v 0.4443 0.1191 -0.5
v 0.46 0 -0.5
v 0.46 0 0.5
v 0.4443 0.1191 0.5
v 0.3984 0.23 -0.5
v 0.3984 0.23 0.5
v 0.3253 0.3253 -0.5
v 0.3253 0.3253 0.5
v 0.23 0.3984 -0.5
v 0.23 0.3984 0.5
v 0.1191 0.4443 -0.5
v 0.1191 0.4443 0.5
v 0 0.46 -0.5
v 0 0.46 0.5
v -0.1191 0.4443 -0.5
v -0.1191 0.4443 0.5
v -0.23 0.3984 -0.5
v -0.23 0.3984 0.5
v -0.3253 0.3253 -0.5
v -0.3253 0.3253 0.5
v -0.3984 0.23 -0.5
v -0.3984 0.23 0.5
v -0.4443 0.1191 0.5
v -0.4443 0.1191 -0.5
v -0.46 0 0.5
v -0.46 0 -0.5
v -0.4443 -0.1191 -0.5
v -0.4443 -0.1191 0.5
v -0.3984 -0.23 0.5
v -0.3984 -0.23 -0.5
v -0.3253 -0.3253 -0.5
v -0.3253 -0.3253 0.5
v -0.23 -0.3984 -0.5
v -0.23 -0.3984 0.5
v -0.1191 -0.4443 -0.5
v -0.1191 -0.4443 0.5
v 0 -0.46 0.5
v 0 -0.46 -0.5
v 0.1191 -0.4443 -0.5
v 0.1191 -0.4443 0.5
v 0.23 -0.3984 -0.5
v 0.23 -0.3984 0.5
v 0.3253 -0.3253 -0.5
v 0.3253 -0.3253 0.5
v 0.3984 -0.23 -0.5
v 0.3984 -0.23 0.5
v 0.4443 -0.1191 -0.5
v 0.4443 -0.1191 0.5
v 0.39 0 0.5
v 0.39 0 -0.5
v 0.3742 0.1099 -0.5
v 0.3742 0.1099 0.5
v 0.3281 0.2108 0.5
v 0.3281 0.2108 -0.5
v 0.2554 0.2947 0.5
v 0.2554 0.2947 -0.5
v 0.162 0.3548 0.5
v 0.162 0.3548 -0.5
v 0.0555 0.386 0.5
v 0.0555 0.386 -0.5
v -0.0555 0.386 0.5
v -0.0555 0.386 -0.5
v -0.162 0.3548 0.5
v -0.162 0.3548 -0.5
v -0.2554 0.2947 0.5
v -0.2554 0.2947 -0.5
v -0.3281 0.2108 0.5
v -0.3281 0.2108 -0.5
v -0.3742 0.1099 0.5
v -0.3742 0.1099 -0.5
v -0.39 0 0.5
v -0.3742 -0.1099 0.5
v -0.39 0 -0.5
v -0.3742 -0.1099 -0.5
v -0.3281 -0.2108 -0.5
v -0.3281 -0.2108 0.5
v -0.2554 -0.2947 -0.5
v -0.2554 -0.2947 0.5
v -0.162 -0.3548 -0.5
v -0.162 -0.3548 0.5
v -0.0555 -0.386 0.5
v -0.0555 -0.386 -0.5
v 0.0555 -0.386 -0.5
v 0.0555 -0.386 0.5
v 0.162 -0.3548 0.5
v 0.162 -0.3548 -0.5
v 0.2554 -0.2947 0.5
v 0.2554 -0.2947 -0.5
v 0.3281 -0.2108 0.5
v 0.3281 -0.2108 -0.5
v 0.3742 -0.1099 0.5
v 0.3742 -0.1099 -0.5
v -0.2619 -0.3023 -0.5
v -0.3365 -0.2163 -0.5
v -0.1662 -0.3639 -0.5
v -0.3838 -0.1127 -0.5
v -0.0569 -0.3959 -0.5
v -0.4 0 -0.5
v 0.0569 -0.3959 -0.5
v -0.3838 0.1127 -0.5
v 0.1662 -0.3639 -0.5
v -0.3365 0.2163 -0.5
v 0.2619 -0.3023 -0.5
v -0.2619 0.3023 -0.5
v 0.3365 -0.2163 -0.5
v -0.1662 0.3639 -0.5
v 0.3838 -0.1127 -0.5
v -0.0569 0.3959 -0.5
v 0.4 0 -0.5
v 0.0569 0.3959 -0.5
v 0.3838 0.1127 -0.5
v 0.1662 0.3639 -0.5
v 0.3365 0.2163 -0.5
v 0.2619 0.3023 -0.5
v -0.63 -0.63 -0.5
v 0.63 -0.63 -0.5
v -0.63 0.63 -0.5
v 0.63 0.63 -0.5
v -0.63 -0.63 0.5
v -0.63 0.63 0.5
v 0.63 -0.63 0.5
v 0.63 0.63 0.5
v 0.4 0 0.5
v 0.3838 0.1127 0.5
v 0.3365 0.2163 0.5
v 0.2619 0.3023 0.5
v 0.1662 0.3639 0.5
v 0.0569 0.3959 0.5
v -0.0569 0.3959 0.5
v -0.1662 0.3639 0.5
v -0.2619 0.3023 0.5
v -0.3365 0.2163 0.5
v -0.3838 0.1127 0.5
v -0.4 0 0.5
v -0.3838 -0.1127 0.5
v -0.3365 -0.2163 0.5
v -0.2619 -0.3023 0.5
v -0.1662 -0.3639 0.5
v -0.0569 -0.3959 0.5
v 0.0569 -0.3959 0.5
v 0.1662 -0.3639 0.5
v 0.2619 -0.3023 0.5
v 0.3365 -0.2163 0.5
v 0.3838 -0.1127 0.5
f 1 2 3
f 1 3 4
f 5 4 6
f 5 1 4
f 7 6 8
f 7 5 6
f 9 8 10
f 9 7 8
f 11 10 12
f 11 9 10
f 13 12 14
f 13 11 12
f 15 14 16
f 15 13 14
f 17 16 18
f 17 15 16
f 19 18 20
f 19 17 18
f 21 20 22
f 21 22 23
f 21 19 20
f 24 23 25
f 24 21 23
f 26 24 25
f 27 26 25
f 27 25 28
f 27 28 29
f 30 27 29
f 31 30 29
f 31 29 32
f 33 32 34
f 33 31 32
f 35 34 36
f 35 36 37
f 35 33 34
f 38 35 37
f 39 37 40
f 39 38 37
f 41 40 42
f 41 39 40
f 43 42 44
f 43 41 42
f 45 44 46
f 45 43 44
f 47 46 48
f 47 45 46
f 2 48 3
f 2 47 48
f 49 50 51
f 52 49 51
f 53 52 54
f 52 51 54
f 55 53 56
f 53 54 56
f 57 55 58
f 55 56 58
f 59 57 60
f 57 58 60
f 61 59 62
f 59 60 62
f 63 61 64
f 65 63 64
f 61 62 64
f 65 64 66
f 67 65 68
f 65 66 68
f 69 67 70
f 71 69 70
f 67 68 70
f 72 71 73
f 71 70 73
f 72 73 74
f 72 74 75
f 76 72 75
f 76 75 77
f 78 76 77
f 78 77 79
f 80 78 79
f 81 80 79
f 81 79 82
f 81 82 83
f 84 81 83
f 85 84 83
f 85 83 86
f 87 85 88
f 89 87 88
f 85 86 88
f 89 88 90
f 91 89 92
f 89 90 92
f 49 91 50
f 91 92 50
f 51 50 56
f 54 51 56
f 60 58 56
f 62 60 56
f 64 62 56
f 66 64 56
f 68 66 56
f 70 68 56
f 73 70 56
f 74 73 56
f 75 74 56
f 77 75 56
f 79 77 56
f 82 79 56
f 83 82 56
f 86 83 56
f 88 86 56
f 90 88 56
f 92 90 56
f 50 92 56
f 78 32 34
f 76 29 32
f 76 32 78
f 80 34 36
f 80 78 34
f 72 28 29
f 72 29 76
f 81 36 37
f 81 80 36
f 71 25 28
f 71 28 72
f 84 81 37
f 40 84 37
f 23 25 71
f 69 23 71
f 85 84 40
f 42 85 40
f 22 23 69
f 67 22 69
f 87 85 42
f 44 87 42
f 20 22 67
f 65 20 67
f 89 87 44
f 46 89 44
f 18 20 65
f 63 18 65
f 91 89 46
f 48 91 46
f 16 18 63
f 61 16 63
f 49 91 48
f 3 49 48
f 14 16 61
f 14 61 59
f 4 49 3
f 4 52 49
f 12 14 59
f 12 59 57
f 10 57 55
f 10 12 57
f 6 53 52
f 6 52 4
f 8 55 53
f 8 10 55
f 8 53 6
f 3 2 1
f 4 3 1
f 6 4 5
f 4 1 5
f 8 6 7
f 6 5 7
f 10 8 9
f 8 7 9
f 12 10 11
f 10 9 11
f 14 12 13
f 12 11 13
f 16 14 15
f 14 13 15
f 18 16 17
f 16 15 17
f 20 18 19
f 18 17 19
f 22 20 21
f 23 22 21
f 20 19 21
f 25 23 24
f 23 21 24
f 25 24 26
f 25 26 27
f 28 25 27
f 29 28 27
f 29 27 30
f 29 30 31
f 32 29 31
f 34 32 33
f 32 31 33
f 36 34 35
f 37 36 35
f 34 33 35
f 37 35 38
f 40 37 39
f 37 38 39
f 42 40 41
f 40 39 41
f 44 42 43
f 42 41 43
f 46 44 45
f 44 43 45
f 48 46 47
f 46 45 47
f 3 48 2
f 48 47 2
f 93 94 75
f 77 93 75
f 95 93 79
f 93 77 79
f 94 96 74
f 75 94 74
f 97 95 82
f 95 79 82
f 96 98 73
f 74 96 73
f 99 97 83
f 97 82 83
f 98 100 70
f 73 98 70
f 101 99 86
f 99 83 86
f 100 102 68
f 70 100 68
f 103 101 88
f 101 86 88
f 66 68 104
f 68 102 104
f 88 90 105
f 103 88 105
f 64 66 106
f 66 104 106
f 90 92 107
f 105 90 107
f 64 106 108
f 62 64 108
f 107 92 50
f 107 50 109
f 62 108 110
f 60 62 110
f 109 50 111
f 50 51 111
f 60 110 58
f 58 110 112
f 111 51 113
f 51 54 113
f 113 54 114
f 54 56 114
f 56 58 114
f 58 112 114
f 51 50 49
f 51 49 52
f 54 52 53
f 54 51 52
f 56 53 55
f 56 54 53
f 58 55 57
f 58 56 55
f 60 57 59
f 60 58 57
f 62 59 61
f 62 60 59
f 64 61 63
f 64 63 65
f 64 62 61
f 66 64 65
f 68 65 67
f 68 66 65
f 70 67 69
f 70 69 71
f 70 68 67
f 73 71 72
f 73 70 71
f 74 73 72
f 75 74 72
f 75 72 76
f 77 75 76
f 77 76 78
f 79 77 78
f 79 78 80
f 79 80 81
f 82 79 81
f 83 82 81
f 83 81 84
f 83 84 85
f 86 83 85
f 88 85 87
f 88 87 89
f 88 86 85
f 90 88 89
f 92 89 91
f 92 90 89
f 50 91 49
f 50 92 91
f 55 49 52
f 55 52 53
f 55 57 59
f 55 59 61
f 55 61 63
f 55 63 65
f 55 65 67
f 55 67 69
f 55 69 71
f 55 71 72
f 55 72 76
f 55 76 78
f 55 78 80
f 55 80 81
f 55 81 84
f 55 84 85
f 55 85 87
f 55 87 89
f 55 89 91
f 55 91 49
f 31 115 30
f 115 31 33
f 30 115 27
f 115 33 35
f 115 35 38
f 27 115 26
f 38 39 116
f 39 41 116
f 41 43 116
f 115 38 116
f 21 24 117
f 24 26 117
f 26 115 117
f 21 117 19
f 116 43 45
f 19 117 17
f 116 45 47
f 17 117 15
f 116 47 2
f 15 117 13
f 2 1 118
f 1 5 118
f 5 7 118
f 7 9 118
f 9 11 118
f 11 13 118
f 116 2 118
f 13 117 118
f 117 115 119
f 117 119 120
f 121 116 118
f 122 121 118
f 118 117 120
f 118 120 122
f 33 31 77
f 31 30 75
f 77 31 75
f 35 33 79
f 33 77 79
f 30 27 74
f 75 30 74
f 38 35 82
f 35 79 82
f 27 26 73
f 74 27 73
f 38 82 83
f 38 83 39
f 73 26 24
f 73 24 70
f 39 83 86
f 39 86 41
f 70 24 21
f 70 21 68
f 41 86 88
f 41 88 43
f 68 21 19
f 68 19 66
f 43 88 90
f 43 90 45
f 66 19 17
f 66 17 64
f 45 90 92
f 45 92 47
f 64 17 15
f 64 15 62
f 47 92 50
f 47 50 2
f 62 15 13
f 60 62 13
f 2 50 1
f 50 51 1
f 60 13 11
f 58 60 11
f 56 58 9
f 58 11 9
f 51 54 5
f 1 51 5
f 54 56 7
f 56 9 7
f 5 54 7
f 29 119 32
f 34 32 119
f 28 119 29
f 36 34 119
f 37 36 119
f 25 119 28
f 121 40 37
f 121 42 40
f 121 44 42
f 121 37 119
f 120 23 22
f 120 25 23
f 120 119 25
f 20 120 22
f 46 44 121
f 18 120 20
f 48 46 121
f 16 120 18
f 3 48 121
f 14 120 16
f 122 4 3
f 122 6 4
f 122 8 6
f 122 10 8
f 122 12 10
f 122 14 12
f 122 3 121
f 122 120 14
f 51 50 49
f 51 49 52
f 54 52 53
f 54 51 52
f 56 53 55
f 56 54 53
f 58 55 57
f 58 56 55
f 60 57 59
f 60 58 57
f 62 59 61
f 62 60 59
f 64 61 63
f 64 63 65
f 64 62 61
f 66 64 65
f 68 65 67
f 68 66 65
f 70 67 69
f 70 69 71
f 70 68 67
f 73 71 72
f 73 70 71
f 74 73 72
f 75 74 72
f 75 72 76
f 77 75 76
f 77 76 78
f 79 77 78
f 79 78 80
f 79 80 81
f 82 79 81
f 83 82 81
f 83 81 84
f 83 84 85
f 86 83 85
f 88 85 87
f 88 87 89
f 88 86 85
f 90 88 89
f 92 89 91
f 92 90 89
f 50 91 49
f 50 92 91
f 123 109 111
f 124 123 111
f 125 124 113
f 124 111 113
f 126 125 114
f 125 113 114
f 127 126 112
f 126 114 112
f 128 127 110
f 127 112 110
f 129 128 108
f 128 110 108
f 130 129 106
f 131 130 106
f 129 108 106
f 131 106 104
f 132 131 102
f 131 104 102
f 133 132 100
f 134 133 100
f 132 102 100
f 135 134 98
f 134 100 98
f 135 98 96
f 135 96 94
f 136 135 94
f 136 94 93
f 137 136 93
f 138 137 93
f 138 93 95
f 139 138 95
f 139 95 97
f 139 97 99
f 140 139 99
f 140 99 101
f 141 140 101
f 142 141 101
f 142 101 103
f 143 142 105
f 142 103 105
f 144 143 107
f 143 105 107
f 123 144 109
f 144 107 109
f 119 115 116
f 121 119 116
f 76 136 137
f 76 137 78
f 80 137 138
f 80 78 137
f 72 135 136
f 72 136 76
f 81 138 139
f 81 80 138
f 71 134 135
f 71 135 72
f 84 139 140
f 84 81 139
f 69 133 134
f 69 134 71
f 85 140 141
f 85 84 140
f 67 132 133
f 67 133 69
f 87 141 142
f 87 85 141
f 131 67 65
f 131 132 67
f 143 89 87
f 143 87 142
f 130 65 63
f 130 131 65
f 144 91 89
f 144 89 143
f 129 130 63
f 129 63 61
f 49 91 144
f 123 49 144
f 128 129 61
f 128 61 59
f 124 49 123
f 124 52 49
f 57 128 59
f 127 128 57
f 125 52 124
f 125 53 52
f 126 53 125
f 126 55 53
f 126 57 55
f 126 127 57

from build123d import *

# Parameters (mm, degrees)
CYLINDER_R        = 0.39
CYLINDER_DEPTH    = 1
CYLINDER001_R     = 0.4
CYLINDER001_DEPTH = 1
CYLINDER004_R     = 0.39
CYLINDER004_DEPTH = 1
CYLINDER003_R     = 0.39
CYLINDER003_DEPTH = 1
CYLINDER002_R     = 0.46
CYLINDER002_DEPTH = 1
CYLINDER005_R     = 0.46
CYLINDER005_DEPTH = 1
BOX_W             = 1.26
BOX_H             = 1.26
BOX_DEPTH         = 1


with BuildPart() as fuel_region:
    # Cylinder → Cylinder (new body)
    with BuildSketch(Plane.XY.offset(-0.5)):
        Circle(CYLINDER_R)
    extrude(amount=CYLINDER_DEPTH)


with BuildPart() as gap_region:
    # Cylinder001 → Cylinder001 (new body)
    with BuildSketch(Plane.XY.offset(-0.5)):
        Circle(CYLINDER001_R)
    extrude(amount=CYLINDER001_DEPTH)

    # Cut: cut fuel_region
    add(fuel_region.part, mode=Mode.SUBTRACT)


with BuildPart() as cylinder004:
    # Cylinder004 → Cylinder004 (new body)
    with BuildSketch(Plane.XY.offset(-0.5)):
        Circle(CYLINDER004_R)
    extrude(amount=CYLINDER004_DEPTH)


with BuildPart() as fuel_region001:
    # Cylinder003 → Cylinder003 (new body)
    with BuildSketch(Plane.XY.offset(-0.5)):
        Circle(CYLINDER003_R)
    extrude(amount=CYLINDER003_DEPTH)


with BuildPart() as clad_region:
    # Cylinder002 → Cylinder002 (new body)
    with BuildSketch(Plane.XY.offset(-0.5)):
        Circle(CYLINDER002_R)
    extrude(amount=CYLINDER002_DEPTH)

    # Cut001: cut fuel_region001
    add(fuel_region001.part, mode=Mode.SUBTRACT)


with BuildPart() as clad_or001:
    # Cylinder005 → Cylinder005 (new body)
    with BuildSketch(Plane.XY.offset(-0.5)):
        Circle(CYLINDER005_R)
    extrude(amount=CYLINDER005_DEPTH)


with BuildPart() as water_region:
    # Box → Box (new body)
    with BuildSketch(Plane(origin=(-0.63, -0.63, -0.5), x_dir=(1, 0, 0), z_dir=(0, 0, 1))):
        with Locations((0.63, 0.63)):
            Rectangle(BOX_W, BOX_H)
    extrude(amount=BOX_DEPTH)

    # Cut002: cut clad_or001
    add(clad_or001.part, mode=Mode.SUBTRACT)


solid = Compound([gap_region.part, cylinder004.part, clad_region.part, water_region.part])
